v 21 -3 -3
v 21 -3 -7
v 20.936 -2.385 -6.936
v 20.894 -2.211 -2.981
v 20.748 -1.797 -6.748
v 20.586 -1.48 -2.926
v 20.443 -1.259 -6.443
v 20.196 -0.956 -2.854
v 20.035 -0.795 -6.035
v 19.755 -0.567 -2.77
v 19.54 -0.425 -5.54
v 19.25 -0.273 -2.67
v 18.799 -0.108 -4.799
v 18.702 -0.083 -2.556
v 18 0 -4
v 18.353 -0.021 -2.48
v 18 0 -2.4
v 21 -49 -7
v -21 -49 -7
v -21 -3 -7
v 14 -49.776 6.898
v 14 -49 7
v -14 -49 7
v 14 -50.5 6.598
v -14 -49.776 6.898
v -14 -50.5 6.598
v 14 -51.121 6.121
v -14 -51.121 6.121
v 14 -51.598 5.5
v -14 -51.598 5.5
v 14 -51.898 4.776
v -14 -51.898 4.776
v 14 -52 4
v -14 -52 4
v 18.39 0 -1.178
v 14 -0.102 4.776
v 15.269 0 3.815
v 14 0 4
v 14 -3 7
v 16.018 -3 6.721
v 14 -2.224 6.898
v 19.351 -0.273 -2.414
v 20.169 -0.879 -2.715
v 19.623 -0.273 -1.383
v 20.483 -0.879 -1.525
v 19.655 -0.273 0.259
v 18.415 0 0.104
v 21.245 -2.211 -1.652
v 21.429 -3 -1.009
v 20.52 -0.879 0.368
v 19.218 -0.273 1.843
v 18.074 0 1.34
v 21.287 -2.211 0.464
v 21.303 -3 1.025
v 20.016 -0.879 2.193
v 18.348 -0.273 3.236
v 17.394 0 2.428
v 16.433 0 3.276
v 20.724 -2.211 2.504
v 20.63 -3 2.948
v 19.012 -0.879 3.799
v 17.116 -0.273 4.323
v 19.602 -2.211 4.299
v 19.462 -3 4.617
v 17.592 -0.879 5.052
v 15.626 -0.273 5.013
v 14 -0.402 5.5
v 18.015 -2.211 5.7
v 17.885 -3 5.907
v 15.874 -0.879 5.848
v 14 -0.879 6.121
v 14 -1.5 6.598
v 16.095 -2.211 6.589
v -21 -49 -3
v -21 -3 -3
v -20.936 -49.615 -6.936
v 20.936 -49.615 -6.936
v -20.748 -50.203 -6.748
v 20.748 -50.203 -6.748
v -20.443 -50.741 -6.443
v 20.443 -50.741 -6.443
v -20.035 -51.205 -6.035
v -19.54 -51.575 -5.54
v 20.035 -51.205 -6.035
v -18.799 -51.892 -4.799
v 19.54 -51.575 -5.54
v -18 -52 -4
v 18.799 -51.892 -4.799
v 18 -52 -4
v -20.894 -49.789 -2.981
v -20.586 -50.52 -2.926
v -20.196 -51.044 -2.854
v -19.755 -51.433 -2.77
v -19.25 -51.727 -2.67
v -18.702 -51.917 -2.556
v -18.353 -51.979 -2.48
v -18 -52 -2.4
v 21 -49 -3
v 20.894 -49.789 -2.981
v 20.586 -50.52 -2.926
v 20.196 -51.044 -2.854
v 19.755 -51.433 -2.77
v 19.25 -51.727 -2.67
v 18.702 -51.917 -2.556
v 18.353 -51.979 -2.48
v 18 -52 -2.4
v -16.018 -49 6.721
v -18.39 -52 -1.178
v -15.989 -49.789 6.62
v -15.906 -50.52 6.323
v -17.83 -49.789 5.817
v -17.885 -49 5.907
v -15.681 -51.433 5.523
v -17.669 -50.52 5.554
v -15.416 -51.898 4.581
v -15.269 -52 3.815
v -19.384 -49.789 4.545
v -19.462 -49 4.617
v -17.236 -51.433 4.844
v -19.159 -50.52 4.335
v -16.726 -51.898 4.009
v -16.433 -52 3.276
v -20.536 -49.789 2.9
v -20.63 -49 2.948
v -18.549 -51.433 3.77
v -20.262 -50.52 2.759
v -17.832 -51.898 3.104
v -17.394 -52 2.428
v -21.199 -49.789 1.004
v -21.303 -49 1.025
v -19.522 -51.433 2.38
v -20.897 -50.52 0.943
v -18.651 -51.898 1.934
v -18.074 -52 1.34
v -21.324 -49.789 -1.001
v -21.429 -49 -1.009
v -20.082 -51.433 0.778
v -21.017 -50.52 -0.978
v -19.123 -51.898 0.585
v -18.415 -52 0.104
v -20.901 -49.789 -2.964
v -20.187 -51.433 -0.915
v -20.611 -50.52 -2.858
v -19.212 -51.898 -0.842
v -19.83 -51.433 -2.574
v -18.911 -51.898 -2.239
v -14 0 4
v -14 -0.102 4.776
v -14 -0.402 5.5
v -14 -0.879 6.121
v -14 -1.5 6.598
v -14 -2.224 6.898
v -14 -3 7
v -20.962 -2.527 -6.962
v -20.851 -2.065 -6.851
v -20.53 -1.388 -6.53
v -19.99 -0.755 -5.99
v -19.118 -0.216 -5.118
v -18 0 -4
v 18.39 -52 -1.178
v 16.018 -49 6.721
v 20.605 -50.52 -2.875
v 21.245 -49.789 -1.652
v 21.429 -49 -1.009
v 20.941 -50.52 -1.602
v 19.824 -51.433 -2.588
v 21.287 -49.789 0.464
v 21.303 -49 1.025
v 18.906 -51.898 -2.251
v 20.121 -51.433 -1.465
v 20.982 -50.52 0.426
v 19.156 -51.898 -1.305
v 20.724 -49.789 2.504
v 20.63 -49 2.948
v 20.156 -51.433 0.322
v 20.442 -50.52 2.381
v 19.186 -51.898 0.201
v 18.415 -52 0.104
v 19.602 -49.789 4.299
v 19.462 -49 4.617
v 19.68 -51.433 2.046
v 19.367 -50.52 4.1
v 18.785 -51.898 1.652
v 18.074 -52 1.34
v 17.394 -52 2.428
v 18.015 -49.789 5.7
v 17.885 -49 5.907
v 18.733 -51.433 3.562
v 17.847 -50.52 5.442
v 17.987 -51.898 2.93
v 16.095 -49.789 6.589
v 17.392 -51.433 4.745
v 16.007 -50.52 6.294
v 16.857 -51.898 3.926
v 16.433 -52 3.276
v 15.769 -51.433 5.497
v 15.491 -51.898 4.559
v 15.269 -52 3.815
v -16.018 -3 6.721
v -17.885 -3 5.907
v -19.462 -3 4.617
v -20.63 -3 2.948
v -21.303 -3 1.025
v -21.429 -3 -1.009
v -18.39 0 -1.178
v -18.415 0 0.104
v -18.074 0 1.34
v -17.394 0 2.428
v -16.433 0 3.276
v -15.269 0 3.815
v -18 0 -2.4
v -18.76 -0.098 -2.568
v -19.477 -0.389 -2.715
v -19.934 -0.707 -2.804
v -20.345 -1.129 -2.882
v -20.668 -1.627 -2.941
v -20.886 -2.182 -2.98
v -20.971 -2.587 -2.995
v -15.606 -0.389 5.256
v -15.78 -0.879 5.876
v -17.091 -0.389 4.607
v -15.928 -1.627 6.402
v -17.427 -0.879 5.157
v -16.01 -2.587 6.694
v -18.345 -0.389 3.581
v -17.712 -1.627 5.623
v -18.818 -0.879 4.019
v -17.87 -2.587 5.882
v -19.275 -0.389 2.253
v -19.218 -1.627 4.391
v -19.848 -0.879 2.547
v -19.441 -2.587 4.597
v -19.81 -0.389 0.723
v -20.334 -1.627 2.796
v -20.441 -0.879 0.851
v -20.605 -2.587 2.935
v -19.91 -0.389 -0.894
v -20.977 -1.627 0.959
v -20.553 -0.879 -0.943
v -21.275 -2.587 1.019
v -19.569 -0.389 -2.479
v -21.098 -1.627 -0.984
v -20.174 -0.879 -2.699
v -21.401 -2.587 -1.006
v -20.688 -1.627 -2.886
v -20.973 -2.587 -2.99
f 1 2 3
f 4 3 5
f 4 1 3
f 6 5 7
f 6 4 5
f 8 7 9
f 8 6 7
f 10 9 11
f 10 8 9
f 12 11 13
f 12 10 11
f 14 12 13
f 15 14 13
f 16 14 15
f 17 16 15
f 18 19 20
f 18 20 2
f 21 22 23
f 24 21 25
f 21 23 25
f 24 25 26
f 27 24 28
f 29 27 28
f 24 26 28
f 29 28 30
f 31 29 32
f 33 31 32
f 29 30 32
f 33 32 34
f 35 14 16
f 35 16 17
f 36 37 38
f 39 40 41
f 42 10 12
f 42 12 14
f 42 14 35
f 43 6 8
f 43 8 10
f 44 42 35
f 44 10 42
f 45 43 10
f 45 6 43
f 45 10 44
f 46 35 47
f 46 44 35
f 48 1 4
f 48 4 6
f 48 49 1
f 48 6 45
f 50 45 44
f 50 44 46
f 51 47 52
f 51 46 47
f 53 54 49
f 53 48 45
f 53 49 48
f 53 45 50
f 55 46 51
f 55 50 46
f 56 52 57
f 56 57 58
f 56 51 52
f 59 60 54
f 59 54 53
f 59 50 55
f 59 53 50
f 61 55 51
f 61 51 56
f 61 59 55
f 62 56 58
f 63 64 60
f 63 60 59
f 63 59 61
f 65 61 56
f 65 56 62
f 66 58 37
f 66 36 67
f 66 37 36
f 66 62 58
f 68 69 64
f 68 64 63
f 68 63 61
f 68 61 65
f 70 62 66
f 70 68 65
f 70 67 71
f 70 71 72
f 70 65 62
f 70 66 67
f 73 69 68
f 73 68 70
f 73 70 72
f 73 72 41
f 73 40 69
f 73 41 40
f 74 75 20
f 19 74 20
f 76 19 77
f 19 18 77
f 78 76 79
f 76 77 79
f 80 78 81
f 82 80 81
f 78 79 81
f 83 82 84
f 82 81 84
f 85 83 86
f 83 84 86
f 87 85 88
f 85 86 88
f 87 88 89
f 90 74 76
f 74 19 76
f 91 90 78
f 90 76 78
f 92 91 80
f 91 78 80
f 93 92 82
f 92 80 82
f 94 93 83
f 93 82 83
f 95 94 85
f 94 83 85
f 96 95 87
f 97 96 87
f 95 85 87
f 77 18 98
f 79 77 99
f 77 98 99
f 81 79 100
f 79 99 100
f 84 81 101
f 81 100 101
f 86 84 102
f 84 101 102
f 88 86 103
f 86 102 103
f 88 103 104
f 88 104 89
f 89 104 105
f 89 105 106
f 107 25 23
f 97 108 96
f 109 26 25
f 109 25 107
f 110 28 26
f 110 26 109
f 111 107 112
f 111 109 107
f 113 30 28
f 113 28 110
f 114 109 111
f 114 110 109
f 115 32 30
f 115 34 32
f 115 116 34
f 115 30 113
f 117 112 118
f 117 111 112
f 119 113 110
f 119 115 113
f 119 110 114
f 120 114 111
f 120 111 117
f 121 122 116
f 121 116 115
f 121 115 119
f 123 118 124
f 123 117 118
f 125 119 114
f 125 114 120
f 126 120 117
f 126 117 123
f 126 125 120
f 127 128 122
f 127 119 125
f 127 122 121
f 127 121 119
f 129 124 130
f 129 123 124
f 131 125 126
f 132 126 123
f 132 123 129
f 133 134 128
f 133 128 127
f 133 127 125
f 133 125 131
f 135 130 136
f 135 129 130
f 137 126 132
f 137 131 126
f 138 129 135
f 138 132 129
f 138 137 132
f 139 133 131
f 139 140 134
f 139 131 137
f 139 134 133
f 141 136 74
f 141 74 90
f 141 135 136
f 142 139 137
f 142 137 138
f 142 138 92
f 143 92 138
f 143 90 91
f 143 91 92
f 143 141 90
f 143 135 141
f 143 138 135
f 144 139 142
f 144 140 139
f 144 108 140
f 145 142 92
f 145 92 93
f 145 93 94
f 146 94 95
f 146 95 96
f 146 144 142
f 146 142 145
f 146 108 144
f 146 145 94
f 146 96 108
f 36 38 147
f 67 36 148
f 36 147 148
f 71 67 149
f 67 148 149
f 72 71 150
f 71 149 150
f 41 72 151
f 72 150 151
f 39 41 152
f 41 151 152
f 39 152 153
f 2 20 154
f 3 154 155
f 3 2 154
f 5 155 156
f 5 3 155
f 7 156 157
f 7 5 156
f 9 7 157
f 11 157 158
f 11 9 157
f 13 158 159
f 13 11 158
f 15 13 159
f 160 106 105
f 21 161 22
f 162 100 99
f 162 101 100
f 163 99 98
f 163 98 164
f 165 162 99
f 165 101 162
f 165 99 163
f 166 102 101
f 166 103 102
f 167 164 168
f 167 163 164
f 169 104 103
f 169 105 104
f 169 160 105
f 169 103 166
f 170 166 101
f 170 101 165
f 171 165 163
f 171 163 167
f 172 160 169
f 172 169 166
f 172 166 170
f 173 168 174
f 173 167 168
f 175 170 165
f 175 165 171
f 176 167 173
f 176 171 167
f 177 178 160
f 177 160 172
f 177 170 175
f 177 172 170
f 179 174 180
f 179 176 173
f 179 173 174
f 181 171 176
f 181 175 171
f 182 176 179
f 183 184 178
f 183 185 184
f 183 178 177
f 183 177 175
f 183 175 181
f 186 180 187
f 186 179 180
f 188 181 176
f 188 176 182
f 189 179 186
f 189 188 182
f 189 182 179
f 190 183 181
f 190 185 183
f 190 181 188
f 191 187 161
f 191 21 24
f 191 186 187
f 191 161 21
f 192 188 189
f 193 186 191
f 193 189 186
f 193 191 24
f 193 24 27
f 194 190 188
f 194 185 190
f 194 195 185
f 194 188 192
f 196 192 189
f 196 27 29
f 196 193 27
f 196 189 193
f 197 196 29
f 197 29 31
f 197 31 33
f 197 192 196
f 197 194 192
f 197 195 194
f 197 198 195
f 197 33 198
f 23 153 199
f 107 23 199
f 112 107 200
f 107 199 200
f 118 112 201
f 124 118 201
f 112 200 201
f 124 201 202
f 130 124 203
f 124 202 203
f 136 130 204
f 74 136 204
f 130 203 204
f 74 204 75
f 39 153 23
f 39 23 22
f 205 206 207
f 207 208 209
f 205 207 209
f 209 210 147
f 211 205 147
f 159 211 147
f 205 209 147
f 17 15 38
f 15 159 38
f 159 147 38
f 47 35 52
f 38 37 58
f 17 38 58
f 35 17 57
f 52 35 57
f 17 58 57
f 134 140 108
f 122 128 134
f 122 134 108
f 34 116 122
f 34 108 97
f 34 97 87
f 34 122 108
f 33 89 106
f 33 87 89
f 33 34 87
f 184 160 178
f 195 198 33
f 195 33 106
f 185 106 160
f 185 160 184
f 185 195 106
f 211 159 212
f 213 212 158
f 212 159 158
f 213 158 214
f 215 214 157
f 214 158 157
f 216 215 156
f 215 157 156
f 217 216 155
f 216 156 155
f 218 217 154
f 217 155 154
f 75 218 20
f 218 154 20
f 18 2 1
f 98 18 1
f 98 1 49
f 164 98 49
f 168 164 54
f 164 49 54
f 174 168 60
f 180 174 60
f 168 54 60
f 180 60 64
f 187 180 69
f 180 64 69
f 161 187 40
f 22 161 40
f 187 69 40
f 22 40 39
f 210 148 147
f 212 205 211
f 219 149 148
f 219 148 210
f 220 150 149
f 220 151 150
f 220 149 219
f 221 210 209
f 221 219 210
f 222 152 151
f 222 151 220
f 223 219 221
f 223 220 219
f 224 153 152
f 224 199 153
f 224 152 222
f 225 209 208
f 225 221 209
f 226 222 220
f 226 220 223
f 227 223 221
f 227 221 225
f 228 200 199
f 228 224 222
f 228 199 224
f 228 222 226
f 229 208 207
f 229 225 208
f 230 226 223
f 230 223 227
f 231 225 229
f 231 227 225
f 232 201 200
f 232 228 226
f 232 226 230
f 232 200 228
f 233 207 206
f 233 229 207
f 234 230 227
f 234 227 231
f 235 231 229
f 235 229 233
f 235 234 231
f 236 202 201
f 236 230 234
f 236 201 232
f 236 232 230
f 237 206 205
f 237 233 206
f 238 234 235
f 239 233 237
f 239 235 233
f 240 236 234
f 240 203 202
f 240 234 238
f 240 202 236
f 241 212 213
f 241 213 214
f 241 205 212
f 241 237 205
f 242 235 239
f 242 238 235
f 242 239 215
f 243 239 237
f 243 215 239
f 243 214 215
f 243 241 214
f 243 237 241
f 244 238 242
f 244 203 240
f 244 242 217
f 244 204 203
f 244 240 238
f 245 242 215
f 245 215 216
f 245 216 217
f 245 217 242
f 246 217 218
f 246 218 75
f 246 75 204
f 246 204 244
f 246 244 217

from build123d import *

# Parameters (mm, degrees)
F0_W     = 28
F0_H     = 14
F1_DEPTH = 52
F2_R     = 3
F3_R     = 3


with BuildPart() as f1:
    # F0 (on Front) → F1 (new body)
    with BuildSketch(Plane.XZ):
        Rectangle(F0_W, F0_H)
        with BuildLine():
            Line((14, 7), (14, -7))
            Line((14, -7), (21, -7))
            Line((21, -7), (21, -3))
            ThreePointArc((21, -3), (20.1032778079, 3.8222944655), (14, 7))
        make_face()
        with BuildLine():
            Line((-21, -7), (-14, -7))
            Line((-14, -7), (-14, 7))
            ThreePointArc((-14, 7), (-20.1032778079, 3.8222944655), (-21, -3))
            Line((-21, -3), (-21, -7))
        make_face()
    extrude(amount=F1_DEPTH)

    # F2
    f2_edges = [f1.edges().sort_by_distance(p)[0] for p in [
        (21, -52, -5),
        (20.103278, -52, 3.822294),
        (0, -52, 7),
        (-20.103278, -52, 3.822294),
        (-21, -52, -5),
        (0, -52, -7),
    ]]
    fillet(f2_edges, radius=F2_R)

    # F3
    f3_edges = [f1.edges().sort_by_distance(p)[0] for p in [
        (21, 0, -5),
        (20.103278, 0, 3.822294),
        (0, 0, 7),
        (-20.103278, 0, 3.822294),
        (-21, 0, -5),
        (0, 0, -7),
    ]]
    fillet(f3_edges, radius=F3_R)


solid = f1.part
